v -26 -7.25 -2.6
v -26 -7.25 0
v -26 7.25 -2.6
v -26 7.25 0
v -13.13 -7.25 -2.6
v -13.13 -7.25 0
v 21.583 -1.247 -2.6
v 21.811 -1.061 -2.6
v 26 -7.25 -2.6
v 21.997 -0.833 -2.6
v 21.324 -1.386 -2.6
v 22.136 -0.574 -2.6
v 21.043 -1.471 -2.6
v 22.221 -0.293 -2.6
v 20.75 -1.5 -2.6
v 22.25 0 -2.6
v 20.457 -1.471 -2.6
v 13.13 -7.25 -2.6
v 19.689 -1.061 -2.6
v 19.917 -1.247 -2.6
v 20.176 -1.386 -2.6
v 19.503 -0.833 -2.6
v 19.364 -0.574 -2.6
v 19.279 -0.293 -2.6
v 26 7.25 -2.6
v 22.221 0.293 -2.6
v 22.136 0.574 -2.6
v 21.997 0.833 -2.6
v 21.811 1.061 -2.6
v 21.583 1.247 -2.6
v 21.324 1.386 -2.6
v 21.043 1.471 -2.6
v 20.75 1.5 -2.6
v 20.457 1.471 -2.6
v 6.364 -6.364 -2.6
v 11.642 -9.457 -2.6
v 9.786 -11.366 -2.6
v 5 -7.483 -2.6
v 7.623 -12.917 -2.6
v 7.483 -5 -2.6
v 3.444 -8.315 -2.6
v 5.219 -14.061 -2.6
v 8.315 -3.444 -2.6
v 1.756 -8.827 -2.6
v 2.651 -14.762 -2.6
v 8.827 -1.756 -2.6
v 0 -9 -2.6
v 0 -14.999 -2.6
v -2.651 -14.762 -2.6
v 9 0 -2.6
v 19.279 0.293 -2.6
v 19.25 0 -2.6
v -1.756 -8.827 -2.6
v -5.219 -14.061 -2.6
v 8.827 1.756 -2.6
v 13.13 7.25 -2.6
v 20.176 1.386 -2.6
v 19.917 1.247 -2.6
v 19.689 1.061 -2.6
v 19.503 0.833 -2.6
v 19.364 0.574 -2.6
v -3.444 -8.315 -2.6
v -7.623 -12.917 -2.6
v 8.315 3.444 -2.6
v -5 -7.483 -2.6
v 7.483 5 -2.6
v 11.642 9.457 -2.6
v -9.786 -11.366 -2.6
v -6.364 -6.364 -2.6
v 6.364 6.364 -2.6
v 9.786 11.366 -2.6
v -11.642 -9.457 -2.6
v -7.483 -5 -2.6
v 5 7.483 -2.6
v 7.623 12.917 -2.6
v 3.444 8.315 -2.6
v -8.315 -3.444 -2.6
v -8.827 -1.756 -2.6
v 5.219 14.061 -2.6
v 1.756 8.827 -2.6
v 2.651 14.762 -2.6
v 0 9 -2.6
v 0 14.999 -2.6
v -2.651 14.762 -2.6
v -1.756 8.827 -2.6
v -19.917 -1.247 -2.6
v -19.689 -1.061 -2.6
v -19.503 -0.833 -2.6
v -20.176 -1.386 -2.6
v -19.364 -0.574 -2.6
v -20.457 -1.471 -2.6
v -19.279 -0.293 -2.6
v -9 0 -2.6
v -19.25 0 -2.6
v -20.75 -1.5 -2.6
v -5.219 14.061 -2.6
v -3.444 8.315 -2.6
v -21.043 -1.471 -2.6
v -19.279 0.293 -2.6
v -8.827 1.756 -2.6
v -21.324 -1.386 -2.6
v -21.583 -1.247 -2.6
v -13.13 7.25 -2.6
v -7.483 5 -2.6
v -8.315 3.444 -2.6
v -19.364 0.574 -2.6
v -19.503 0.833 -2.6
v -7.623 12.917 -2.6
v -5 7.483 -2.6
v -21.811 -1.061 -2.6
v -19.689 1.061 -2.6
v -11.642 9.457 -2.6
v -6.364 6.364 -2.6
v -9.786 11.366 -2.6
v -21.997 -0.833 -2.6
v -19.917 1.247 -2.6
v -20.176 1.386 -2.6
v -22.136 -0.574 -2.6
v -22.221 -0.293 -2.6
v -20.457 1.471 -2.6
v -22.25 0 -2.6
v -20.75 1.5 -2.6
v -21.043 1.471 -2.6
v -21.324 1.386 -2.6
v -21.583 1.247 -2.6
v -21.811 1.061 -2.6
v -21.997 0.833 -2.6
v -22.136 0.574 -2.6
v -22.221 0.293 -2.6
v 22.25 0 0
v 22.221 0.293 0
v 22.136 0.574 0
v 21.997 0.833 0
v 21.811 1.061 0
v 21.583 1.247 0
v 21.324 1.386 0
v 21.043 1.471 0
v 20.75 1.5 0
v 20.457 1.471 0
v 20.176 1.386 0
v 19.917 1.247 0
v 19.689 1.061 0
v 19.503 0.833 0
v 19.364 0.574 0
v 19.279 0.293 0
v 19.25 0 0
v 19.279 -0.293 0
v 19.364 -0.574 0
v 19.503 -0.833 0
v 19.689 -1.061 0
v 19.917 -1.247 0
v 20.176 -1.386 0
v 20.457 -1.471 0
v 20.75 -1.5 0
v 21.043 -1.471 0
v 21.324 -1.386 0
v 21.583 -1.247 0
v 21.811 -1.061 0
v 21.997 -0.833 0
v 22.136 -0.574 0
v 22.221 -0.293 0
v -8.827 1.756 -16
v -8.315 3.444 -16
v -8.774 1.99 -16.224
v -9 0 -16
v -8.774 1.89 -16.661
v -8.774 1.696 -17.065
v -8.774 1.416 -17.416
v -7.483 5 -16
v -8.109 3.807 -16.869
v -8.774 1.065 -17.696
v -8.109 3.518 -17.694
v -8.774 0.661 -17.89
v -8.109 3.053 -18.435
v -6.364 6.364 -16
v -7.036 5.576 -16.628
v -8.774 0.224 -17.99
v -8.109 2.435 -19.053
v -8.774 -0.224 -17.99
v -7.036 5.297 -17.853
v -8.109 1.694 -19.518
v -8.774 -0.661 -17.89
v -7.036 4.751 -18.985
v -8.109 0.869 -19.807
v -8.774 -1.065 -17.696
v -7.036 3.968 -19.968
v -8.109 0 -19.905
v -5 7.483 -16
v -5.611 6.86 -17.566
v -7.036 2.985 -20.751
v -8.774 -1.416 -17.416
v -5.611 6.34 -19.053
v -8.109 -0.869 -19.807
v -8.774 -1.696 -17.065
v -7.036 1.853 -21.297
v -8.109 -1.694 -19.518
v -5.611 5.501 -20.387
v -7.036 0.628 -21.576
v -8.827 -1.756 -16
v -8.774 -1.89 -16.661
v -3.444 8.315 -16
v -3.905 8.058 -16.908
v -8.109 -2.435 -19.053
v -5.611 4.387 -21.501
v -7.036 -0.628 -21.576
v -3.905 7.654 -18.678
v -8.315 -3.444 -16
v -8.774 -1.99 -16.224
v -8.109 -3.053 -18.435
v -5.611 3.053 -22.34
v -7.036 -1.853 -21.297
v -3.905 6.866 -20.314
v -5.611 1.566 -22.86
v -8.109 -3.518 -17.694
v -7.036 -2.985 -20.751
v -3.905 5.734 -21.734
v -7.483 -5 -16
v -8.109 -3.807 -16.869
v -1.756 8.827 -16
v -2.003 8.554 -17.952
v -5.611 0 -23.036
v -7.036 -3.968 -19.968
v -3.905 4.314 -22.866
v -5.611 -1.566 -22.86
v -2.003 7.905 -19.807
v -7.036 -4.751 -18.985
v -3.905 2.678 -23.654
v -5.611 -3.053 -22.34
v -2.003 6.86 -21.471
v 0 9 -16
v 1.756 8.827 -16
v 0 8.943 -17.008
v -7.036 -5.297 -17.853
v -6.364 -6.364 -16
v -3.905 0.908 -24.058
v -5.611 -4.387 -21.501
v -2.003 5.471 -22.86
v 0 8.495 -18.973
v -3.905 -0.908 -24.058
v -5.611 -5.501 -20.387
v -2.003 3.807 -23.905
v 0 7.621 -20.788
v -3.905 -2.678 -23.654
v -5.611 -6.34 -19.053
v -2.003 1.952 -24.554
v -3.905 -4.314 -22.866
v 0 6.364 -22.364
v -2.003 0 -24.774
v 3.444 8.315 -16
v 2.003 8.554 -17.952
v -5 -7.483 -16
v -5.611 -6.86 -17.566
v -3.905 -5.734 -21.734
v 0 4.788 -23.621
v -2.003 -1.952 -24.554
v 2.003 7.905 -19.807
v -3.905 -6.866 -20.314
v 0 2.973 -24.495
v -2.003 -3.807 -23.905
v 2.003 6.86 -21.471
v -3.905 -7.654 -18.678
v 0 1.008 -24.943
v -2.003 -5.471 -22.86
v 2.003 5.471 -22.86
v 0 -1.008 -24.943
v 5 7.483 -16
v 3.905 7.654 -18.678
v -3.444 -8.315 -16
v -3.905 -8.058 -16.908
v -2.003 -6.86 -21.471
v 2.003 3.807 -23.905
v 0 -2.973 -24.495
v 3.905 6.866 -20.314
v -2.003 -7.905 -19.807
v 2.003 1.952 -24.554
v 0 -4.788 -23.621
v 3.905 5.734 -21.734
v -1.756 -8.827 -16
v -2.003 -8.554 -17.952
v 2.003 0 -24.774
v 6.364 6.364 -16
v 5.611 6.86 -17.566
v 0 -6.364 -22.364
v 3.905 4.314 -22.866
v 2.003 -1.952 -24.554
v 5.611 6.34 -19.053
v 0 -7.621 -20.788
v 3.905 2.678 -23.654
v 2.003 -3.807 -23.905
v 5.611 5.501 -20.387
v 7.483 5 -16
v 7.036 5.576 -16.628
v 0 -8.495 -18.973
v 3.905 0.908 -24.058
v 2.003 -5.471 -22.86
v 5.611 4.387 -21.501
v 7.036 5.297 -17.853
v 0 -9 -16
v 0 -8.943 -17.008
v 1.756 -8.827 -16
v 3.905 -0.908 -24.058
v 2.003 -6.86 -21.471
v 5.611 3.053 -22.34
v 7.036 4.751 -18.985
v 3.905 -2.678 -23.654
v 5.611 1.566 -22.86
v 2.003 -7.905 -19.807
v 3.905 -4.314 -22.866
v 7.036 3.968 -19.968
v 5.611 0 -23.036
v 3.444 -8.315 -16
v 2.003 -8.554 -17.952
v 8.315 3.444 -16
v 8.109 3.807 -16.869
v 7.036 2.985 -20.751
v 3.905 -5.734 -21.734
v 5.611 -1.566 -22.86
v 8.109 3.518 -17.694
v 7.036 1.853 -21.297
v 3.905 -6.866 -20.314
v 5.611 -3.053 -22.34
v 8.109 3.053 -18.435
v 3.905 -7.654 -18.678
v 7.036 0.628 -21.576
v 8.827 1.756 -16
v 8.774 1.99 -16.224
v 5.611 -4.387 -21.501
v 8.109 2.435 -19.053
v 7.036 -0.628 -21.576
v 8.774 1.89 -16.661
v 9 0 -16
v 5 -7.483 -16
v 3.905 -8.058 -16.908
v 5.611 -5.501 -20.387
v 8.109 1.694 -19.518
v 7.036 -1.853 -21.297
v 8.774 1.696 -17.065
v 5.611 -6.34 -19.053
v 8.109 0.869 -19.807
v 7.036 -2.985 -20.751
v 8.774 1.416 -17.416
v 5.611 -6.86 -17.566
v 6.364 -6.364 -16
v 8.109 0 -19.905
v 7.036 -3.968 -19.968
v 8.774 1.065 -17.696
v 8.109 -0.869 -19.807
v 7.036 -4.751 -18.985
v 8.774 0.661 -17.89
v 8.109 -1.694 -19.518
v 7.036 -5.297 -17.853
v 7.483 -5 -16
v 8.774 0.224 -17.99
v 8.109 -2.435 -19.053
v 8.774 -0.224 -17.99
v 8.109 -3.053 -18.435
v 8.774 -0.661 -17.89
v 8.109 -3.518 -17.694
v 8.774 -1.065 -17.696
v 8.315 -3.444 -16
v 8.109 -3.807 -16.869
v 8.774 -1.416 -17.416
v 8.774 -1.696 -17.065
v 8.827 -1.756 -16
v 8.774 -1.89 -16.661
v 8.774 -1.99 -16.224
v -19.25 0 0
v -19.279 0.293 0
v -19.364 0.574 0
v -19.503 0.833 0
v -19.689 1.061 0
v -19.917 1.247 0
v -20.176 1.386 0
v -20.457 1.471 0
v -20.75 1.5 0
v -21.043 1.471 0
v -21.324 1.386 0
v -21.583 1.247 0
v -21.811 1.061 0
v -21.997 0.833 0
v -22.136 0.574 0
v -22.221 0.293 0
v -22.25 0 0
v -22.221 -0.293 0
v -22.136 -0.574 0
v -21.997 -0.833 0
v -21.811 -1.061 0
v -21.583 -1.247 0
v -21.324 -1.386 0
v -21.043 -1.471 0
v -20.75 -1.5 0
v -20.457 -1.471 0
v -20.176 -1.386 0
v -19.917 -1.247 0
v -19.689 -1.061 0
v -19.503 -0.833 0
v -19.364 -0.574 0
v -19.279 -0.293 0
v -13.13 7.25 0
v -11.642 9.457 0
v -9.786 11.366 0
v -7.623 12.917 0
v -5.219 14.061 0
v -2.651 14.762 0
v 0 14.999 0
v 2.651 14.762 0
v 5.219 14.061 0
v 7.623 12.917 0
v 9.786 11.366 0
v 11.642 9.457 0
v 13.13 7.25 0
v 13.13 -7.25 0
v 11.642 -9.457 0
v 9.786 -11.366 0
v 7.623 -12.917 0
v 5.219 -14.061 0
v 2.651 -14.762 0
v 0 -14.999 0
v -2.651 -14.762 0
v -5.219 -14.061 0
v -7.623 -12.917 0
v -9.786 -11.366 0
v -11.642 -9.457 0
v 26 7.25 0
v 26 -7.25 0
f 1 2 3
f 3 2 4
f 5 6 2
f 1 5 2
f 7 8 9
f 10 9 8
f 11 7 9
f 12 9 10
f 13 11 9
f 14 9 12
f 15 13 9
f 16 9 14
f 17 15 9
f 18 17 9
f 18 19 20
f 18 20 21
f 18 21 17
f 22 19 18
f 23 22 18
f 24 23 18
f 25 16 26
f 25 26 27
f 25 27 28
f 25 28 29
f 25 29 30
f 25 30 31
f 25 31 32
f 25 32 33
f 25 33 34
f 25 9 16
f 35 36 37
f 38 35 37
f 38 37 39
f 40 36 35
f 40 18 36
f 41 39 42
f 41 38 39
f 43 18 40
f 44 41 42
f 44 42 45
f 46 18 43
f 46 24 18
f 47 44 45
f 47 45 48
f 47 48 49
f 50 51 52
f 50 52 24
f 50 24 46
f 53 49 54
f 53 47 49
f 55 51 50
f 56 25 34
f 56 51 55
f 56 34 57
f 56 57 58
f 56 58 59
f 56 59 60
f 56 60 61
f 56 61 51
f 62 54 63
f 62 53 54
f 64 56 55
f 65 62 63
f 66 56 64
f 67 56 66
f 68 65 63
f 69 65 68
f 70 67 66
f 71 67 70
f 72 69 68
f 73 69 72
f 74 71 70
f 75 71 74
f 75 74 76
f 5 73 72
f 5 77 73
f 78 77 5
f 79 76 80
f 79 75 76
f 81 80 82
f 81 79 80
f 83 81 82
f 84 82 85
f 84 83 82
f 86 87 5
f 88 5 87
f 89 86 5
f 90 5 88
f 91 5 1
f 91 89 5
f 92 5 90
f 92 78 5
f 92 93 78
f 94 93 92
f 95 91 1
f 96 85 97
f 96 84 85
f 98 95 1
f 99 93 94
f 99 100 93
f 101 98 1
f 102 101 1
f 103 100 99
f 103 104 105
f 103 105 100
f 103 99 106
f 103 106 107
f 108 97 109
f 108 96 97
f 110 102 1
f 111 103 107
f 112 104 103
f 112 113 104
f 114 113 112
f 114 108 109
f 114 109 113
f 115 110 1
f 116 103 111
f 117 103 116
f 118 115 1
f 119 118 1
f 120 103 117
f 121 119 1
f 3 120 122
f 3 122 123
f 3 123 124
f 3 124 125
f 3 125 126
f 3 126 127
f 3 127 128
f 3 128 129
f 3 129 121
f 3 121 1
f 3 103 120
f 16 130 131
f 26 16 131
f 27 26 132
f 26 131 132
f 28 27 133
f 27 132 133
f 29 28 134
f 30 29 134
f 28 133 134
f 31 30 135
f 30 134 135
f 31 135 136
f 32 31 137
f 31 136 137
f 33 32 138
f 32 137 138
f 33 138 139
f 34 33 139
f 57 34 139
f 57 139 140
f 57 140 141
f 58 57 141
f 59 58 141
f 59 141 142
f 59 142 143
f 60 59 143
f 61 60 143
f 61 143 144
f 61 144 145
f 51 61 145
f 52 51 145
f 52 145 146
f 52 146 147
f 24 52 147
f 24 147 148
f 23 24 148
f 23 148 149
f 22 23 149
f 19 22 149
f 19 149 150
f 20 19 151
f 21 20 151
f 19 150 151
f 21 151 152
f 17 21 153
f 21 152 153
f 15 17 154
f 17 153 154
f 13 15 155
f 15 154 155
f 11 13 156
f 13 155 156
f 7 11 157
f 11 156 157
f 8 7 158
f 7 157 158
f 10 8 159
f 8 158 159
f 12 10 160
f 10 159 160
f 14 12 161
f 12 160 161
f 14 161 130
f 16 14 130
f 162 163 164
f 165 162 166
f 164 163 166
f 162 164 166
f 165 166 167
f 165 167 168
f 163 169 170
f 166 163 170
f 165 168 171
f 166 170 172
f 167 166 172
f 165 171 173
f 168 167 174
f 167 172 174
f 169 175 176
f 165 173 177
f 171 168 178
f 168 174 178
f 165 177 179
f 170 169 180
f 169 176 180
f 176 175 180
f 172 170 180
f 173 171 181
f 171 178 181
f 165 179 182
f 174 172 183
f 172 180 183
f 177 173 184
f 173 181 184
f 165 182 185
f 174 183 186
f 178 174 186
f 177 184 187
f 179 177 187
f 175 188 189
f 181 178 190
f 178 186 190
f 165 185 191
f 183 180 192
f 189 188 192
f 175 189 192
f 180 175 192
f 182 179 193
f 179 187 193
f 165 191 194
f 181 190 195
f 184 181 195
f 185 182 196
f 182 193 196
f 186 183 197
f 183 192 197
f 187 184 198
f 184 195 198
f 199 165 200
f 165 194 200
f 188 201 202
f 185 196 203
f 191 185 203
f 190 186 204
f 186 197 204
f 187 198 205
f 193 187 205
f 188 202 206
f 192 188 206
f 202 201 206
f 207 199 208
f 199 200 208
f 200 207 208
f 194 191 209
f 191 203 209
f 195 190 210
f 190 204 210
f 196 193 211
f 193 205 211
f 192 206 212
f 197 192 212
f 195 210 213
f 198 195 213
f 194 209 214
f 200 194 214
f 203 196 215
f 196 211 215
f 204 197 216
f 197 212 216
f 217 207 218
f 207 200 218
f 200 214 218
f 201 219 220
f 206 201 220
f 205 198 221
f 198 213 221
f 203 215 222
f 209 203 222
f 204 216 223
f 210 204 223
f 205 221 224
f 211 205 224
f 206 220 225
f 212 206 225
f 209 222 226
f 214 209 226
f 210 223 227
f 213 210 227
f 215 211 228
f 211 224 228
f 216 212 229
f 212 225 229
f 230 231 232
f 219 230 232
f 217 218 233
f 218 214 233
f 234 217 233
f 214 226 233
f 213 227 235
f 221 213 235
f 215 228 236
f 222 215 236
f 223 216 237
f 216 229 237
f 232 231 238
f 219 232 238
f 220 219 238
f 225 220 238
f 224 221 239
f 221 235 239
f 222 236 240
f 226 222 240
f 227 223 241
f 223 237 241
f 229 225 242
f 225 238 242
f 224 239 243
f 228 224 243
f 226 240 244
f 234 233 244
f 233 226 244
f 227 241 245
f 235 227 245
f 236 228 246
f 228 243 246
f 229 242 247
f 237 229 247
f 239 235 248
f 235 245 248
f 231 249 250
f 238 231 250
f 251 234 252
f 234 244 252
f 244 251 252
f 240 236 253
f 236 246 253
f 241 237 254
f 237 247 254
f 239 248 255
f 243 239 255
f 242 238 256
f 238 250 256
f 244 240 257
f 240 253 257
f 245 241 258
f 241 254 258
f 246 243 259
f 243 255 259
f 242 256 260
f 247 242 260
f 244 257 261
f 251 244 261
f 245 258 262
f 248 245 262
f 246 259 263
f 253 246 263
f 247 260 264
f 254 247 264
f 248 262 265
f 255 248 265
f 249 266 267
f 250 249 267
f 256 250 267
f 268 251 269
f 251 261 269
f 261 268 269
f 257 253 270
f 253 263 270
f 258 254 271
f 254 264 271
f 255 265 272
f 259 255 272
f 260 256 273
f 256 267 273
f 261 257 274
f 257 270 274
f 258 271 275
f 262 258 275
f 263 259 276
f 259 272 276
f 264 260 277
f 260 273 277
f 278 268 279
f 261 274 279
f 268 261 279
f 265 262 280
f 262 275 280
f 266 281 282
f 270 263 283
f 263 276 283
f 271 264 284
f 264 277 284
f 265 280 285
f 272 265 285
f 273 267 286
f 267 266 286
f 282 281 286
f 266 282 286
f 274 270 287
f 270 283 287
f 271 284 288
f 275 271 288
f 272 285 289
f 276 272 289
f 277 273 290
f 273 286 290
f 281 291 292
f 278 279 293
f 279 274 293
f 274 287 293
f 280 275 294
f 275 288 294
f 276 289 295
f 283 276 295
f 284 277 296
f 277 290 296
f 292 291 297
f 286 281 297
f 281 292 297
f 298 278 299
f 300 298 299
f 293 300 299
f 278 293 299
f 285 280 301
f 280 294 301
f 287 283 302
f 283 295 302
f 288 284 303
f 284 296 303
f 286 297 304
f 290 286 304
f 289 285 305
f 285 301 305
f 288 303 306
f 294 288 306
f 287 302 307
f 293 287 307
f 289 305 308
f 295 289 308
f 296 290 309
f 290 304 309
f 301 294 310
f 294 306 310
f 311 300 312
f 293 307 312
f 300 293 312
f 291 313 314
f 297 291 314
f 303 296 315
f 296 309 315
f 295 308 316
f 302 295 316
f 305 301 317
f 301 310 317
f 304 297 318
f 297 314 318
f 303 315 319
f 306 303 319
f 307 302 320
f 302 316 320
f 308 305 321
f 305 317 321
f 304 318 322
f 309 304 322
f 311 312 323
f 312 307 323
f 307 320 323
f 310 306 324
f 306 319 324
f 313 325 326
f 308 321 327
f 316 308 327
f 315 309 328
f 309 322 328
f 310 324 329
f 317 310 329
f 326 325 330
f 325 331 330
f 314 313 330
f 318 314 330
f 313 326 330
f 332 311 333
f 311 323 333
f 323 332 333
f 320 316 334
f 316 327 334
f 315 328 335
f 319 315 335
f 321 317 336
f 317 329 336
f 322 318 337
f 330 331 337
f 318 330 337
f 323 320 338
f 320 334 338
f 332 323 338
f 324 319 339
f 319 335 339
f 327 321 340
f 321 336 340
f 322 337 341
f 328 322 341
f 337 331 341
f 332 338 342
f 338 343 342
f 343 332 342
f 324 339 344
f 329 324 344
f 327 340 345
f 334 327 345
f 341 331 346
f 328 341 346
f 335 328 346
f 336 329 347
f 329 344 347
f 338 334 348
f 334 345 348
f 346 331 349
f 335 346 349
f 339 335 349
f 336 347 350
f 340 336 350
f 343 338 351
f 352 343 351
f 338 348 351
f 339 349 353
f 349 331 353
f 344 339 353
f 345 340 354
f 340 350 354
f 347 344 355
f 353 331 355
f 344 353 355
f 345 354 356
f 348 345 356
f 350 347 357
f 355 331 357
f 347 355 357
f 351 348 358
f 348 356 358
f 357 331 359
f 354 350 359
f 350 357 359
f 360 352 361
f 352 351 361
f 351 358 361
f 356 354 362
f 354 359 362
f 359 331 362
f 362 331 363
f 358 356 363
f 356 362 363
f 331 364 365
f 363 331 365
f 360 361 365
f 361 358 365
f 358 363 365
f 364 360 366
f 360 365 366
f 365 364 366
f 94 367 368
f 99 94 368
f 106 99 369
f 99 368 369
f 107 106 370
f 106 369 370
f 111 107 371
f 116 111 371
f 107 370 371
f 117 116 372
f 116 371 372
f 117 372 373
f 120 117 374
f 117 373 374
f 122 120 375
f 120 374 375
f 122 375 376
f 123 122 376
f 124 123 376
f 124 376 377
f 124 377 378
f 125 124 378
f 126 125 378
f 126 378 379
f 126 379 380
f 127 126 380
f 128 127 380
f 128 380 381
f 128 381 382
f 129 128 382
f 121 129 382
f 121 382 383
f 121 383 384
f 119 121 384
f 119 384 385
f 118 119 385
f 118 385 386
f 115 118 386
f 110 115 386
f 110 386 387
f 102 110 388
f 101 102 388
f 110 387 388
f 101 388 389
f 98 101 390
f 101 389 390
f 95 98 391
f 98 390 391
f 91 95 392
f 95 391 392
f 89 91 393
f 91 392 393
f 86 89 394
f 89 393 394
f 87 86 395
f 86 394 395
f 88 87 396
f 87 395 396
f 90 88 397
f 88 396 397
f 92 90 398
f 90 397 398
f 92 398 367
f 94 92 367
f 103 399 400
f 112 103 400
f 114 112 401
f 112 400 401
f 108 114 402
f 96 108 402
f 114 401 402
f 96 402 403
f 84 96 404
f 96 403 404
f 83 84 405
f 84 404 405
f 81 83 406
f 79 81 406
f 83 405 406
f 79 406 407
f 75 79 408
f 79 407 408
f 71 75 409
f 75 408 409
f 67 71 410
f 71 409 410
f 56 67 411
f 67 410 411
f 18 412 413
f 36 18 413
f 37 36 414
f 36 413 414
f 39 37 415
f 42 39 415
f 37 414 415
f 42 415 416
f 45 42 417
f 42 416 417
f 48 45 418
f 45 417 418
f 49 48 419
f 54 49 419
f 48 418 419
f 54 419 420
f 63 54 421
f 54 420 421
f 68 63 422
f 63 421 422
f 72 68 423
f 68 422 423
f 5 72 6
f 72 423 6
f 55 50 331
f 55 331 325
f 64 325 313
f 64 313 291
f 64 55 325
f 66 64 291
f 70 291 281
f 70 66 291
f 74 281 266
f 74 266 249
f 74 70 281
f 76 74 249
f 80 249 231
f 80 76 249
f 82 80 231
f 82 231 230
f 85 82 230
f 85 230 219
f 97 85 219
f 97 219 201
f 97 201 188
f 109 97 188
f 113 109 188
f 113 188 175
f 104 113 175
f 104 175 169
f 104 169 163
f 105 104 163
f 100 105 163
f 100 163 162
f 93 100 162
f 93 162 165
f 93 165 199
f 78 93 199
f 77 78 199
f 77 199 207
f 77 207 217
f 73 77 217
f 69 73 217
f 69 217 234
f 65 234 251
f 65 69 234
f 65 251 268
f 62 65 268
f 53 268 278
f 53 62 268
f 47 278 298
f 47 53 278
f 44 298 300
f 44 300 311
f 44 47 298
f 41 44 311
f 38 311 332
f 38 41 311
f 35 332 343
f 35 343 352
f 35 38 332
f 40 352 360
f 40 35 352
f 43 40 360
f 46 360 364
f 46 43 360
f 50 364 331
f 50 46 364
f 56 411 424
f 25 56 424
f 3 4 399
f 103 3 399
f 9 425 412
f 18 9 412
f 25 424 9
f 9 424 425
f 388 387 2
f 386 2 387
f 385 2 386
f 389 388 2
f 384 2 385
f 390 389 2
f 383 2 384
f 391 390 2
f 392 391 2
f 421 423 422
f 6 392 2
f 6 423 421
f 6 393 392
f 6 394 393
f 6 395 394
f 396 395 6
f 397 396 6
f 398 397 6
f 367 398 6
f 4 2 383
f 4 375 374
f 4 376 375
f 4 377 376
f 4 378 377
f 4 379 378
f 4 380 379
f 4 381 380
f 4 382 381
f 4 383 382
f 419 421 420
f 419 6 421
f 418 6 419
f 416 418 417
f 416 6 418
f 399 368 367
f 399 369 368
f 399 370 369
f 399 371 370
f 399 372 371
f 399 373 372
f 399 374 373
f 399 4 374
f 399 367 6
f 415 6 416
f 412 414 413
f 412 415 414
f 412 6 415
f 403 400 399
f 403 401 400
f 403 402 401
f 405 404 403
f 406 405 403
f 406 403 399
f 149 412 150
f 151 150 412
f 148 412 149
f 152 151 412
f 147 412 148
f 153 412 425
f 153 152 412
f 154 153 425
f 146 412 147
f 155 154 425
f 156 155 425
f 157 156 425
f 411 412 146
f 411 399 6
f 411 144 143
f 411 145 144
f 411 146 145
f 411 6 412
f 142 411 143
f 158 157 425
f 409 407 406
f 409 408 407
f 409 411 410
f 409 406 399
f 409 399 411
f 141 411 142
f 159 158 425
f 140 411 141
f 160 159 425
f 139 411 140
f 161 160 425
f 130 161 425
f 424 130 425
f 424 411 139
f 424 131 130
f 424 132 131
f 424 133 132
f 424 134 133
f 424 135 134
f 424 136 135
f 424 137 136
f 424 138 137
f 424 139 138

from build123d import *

# Parameters (mm, degrees)
BOSS_EXTRUDE2_DEPTH = 2.6
SKETCH2_R           = 9
BOSS_EXTRUDE3_DEPTH = 16
REVOLVE1_ANGLE      = 180
SKETCH5_R           = 1.5
CUT_EXTRUDE1_DEPTH  = 16


with BuildPart() as part:
    # Sketch1 → Boss-Extrude2 (new body)
    with BuildSketch(Plane.XY):
        with BuildLine():
            Line((-26, -7.25), (-26, 7.25))
            Line((-26, 7.25), (-13.13, 7.25))
            ThreePointArc((-13.13, 7.25), (0, 14.998646606), (13.13, 7.25))
            Line((13.13, 7.25), (26, 7.25))
            Line((26, 7.25), (26, -7.25))
            Line((26, -7.25), (13.13, -7.25))
            ThreePointArc((13.13, -7.25), (0, -14.998646606), (-13.13, -7.25))
            Line((-13.13, -7.25), (-26, -7.25))
        make_face()
    extrude(amount=-BOSS_EXTRUDE2_DEPTH)

    # Sketch2 → Boss-Extrude3 (add)
    with BuildSketch(Plane.XY):
        Circle(SKETCH2_R)
    extrude(amount=-BOSS_EXTRUDE3_DEPTH)

    # Sketch3 → Revolve1 (revolve)
    with BuildSketch(Plane(origin=(0, 0, -16), x_dir=(-1, 0, 0), z_dir=(0, 0, -1))):
        with BuildLine():
            Line((-9, 0), (9, 0))
            ThreePointArc((9, 0), (0, 9), (-9, 0))
        make_face()
    revolve(axis=Axis((9, 0, -16), (-1, 0, 0)), revolution_arc=REVOLVE1_ANGLE)

    # Sketch5 → Cut-Extrude1 (cut)
    with BuildSketch(Plane.XY):
        with Locations((-20.75, 0)):
            Circle(SKETCH5_R)
        with Locations((20.75, 0)):
            Circle(SKETCH5_R)
    extrude(amount=-CUT_EXTRUDE1_DEPTH, mode=Mode.SUBTRACT)


solid = part.part
